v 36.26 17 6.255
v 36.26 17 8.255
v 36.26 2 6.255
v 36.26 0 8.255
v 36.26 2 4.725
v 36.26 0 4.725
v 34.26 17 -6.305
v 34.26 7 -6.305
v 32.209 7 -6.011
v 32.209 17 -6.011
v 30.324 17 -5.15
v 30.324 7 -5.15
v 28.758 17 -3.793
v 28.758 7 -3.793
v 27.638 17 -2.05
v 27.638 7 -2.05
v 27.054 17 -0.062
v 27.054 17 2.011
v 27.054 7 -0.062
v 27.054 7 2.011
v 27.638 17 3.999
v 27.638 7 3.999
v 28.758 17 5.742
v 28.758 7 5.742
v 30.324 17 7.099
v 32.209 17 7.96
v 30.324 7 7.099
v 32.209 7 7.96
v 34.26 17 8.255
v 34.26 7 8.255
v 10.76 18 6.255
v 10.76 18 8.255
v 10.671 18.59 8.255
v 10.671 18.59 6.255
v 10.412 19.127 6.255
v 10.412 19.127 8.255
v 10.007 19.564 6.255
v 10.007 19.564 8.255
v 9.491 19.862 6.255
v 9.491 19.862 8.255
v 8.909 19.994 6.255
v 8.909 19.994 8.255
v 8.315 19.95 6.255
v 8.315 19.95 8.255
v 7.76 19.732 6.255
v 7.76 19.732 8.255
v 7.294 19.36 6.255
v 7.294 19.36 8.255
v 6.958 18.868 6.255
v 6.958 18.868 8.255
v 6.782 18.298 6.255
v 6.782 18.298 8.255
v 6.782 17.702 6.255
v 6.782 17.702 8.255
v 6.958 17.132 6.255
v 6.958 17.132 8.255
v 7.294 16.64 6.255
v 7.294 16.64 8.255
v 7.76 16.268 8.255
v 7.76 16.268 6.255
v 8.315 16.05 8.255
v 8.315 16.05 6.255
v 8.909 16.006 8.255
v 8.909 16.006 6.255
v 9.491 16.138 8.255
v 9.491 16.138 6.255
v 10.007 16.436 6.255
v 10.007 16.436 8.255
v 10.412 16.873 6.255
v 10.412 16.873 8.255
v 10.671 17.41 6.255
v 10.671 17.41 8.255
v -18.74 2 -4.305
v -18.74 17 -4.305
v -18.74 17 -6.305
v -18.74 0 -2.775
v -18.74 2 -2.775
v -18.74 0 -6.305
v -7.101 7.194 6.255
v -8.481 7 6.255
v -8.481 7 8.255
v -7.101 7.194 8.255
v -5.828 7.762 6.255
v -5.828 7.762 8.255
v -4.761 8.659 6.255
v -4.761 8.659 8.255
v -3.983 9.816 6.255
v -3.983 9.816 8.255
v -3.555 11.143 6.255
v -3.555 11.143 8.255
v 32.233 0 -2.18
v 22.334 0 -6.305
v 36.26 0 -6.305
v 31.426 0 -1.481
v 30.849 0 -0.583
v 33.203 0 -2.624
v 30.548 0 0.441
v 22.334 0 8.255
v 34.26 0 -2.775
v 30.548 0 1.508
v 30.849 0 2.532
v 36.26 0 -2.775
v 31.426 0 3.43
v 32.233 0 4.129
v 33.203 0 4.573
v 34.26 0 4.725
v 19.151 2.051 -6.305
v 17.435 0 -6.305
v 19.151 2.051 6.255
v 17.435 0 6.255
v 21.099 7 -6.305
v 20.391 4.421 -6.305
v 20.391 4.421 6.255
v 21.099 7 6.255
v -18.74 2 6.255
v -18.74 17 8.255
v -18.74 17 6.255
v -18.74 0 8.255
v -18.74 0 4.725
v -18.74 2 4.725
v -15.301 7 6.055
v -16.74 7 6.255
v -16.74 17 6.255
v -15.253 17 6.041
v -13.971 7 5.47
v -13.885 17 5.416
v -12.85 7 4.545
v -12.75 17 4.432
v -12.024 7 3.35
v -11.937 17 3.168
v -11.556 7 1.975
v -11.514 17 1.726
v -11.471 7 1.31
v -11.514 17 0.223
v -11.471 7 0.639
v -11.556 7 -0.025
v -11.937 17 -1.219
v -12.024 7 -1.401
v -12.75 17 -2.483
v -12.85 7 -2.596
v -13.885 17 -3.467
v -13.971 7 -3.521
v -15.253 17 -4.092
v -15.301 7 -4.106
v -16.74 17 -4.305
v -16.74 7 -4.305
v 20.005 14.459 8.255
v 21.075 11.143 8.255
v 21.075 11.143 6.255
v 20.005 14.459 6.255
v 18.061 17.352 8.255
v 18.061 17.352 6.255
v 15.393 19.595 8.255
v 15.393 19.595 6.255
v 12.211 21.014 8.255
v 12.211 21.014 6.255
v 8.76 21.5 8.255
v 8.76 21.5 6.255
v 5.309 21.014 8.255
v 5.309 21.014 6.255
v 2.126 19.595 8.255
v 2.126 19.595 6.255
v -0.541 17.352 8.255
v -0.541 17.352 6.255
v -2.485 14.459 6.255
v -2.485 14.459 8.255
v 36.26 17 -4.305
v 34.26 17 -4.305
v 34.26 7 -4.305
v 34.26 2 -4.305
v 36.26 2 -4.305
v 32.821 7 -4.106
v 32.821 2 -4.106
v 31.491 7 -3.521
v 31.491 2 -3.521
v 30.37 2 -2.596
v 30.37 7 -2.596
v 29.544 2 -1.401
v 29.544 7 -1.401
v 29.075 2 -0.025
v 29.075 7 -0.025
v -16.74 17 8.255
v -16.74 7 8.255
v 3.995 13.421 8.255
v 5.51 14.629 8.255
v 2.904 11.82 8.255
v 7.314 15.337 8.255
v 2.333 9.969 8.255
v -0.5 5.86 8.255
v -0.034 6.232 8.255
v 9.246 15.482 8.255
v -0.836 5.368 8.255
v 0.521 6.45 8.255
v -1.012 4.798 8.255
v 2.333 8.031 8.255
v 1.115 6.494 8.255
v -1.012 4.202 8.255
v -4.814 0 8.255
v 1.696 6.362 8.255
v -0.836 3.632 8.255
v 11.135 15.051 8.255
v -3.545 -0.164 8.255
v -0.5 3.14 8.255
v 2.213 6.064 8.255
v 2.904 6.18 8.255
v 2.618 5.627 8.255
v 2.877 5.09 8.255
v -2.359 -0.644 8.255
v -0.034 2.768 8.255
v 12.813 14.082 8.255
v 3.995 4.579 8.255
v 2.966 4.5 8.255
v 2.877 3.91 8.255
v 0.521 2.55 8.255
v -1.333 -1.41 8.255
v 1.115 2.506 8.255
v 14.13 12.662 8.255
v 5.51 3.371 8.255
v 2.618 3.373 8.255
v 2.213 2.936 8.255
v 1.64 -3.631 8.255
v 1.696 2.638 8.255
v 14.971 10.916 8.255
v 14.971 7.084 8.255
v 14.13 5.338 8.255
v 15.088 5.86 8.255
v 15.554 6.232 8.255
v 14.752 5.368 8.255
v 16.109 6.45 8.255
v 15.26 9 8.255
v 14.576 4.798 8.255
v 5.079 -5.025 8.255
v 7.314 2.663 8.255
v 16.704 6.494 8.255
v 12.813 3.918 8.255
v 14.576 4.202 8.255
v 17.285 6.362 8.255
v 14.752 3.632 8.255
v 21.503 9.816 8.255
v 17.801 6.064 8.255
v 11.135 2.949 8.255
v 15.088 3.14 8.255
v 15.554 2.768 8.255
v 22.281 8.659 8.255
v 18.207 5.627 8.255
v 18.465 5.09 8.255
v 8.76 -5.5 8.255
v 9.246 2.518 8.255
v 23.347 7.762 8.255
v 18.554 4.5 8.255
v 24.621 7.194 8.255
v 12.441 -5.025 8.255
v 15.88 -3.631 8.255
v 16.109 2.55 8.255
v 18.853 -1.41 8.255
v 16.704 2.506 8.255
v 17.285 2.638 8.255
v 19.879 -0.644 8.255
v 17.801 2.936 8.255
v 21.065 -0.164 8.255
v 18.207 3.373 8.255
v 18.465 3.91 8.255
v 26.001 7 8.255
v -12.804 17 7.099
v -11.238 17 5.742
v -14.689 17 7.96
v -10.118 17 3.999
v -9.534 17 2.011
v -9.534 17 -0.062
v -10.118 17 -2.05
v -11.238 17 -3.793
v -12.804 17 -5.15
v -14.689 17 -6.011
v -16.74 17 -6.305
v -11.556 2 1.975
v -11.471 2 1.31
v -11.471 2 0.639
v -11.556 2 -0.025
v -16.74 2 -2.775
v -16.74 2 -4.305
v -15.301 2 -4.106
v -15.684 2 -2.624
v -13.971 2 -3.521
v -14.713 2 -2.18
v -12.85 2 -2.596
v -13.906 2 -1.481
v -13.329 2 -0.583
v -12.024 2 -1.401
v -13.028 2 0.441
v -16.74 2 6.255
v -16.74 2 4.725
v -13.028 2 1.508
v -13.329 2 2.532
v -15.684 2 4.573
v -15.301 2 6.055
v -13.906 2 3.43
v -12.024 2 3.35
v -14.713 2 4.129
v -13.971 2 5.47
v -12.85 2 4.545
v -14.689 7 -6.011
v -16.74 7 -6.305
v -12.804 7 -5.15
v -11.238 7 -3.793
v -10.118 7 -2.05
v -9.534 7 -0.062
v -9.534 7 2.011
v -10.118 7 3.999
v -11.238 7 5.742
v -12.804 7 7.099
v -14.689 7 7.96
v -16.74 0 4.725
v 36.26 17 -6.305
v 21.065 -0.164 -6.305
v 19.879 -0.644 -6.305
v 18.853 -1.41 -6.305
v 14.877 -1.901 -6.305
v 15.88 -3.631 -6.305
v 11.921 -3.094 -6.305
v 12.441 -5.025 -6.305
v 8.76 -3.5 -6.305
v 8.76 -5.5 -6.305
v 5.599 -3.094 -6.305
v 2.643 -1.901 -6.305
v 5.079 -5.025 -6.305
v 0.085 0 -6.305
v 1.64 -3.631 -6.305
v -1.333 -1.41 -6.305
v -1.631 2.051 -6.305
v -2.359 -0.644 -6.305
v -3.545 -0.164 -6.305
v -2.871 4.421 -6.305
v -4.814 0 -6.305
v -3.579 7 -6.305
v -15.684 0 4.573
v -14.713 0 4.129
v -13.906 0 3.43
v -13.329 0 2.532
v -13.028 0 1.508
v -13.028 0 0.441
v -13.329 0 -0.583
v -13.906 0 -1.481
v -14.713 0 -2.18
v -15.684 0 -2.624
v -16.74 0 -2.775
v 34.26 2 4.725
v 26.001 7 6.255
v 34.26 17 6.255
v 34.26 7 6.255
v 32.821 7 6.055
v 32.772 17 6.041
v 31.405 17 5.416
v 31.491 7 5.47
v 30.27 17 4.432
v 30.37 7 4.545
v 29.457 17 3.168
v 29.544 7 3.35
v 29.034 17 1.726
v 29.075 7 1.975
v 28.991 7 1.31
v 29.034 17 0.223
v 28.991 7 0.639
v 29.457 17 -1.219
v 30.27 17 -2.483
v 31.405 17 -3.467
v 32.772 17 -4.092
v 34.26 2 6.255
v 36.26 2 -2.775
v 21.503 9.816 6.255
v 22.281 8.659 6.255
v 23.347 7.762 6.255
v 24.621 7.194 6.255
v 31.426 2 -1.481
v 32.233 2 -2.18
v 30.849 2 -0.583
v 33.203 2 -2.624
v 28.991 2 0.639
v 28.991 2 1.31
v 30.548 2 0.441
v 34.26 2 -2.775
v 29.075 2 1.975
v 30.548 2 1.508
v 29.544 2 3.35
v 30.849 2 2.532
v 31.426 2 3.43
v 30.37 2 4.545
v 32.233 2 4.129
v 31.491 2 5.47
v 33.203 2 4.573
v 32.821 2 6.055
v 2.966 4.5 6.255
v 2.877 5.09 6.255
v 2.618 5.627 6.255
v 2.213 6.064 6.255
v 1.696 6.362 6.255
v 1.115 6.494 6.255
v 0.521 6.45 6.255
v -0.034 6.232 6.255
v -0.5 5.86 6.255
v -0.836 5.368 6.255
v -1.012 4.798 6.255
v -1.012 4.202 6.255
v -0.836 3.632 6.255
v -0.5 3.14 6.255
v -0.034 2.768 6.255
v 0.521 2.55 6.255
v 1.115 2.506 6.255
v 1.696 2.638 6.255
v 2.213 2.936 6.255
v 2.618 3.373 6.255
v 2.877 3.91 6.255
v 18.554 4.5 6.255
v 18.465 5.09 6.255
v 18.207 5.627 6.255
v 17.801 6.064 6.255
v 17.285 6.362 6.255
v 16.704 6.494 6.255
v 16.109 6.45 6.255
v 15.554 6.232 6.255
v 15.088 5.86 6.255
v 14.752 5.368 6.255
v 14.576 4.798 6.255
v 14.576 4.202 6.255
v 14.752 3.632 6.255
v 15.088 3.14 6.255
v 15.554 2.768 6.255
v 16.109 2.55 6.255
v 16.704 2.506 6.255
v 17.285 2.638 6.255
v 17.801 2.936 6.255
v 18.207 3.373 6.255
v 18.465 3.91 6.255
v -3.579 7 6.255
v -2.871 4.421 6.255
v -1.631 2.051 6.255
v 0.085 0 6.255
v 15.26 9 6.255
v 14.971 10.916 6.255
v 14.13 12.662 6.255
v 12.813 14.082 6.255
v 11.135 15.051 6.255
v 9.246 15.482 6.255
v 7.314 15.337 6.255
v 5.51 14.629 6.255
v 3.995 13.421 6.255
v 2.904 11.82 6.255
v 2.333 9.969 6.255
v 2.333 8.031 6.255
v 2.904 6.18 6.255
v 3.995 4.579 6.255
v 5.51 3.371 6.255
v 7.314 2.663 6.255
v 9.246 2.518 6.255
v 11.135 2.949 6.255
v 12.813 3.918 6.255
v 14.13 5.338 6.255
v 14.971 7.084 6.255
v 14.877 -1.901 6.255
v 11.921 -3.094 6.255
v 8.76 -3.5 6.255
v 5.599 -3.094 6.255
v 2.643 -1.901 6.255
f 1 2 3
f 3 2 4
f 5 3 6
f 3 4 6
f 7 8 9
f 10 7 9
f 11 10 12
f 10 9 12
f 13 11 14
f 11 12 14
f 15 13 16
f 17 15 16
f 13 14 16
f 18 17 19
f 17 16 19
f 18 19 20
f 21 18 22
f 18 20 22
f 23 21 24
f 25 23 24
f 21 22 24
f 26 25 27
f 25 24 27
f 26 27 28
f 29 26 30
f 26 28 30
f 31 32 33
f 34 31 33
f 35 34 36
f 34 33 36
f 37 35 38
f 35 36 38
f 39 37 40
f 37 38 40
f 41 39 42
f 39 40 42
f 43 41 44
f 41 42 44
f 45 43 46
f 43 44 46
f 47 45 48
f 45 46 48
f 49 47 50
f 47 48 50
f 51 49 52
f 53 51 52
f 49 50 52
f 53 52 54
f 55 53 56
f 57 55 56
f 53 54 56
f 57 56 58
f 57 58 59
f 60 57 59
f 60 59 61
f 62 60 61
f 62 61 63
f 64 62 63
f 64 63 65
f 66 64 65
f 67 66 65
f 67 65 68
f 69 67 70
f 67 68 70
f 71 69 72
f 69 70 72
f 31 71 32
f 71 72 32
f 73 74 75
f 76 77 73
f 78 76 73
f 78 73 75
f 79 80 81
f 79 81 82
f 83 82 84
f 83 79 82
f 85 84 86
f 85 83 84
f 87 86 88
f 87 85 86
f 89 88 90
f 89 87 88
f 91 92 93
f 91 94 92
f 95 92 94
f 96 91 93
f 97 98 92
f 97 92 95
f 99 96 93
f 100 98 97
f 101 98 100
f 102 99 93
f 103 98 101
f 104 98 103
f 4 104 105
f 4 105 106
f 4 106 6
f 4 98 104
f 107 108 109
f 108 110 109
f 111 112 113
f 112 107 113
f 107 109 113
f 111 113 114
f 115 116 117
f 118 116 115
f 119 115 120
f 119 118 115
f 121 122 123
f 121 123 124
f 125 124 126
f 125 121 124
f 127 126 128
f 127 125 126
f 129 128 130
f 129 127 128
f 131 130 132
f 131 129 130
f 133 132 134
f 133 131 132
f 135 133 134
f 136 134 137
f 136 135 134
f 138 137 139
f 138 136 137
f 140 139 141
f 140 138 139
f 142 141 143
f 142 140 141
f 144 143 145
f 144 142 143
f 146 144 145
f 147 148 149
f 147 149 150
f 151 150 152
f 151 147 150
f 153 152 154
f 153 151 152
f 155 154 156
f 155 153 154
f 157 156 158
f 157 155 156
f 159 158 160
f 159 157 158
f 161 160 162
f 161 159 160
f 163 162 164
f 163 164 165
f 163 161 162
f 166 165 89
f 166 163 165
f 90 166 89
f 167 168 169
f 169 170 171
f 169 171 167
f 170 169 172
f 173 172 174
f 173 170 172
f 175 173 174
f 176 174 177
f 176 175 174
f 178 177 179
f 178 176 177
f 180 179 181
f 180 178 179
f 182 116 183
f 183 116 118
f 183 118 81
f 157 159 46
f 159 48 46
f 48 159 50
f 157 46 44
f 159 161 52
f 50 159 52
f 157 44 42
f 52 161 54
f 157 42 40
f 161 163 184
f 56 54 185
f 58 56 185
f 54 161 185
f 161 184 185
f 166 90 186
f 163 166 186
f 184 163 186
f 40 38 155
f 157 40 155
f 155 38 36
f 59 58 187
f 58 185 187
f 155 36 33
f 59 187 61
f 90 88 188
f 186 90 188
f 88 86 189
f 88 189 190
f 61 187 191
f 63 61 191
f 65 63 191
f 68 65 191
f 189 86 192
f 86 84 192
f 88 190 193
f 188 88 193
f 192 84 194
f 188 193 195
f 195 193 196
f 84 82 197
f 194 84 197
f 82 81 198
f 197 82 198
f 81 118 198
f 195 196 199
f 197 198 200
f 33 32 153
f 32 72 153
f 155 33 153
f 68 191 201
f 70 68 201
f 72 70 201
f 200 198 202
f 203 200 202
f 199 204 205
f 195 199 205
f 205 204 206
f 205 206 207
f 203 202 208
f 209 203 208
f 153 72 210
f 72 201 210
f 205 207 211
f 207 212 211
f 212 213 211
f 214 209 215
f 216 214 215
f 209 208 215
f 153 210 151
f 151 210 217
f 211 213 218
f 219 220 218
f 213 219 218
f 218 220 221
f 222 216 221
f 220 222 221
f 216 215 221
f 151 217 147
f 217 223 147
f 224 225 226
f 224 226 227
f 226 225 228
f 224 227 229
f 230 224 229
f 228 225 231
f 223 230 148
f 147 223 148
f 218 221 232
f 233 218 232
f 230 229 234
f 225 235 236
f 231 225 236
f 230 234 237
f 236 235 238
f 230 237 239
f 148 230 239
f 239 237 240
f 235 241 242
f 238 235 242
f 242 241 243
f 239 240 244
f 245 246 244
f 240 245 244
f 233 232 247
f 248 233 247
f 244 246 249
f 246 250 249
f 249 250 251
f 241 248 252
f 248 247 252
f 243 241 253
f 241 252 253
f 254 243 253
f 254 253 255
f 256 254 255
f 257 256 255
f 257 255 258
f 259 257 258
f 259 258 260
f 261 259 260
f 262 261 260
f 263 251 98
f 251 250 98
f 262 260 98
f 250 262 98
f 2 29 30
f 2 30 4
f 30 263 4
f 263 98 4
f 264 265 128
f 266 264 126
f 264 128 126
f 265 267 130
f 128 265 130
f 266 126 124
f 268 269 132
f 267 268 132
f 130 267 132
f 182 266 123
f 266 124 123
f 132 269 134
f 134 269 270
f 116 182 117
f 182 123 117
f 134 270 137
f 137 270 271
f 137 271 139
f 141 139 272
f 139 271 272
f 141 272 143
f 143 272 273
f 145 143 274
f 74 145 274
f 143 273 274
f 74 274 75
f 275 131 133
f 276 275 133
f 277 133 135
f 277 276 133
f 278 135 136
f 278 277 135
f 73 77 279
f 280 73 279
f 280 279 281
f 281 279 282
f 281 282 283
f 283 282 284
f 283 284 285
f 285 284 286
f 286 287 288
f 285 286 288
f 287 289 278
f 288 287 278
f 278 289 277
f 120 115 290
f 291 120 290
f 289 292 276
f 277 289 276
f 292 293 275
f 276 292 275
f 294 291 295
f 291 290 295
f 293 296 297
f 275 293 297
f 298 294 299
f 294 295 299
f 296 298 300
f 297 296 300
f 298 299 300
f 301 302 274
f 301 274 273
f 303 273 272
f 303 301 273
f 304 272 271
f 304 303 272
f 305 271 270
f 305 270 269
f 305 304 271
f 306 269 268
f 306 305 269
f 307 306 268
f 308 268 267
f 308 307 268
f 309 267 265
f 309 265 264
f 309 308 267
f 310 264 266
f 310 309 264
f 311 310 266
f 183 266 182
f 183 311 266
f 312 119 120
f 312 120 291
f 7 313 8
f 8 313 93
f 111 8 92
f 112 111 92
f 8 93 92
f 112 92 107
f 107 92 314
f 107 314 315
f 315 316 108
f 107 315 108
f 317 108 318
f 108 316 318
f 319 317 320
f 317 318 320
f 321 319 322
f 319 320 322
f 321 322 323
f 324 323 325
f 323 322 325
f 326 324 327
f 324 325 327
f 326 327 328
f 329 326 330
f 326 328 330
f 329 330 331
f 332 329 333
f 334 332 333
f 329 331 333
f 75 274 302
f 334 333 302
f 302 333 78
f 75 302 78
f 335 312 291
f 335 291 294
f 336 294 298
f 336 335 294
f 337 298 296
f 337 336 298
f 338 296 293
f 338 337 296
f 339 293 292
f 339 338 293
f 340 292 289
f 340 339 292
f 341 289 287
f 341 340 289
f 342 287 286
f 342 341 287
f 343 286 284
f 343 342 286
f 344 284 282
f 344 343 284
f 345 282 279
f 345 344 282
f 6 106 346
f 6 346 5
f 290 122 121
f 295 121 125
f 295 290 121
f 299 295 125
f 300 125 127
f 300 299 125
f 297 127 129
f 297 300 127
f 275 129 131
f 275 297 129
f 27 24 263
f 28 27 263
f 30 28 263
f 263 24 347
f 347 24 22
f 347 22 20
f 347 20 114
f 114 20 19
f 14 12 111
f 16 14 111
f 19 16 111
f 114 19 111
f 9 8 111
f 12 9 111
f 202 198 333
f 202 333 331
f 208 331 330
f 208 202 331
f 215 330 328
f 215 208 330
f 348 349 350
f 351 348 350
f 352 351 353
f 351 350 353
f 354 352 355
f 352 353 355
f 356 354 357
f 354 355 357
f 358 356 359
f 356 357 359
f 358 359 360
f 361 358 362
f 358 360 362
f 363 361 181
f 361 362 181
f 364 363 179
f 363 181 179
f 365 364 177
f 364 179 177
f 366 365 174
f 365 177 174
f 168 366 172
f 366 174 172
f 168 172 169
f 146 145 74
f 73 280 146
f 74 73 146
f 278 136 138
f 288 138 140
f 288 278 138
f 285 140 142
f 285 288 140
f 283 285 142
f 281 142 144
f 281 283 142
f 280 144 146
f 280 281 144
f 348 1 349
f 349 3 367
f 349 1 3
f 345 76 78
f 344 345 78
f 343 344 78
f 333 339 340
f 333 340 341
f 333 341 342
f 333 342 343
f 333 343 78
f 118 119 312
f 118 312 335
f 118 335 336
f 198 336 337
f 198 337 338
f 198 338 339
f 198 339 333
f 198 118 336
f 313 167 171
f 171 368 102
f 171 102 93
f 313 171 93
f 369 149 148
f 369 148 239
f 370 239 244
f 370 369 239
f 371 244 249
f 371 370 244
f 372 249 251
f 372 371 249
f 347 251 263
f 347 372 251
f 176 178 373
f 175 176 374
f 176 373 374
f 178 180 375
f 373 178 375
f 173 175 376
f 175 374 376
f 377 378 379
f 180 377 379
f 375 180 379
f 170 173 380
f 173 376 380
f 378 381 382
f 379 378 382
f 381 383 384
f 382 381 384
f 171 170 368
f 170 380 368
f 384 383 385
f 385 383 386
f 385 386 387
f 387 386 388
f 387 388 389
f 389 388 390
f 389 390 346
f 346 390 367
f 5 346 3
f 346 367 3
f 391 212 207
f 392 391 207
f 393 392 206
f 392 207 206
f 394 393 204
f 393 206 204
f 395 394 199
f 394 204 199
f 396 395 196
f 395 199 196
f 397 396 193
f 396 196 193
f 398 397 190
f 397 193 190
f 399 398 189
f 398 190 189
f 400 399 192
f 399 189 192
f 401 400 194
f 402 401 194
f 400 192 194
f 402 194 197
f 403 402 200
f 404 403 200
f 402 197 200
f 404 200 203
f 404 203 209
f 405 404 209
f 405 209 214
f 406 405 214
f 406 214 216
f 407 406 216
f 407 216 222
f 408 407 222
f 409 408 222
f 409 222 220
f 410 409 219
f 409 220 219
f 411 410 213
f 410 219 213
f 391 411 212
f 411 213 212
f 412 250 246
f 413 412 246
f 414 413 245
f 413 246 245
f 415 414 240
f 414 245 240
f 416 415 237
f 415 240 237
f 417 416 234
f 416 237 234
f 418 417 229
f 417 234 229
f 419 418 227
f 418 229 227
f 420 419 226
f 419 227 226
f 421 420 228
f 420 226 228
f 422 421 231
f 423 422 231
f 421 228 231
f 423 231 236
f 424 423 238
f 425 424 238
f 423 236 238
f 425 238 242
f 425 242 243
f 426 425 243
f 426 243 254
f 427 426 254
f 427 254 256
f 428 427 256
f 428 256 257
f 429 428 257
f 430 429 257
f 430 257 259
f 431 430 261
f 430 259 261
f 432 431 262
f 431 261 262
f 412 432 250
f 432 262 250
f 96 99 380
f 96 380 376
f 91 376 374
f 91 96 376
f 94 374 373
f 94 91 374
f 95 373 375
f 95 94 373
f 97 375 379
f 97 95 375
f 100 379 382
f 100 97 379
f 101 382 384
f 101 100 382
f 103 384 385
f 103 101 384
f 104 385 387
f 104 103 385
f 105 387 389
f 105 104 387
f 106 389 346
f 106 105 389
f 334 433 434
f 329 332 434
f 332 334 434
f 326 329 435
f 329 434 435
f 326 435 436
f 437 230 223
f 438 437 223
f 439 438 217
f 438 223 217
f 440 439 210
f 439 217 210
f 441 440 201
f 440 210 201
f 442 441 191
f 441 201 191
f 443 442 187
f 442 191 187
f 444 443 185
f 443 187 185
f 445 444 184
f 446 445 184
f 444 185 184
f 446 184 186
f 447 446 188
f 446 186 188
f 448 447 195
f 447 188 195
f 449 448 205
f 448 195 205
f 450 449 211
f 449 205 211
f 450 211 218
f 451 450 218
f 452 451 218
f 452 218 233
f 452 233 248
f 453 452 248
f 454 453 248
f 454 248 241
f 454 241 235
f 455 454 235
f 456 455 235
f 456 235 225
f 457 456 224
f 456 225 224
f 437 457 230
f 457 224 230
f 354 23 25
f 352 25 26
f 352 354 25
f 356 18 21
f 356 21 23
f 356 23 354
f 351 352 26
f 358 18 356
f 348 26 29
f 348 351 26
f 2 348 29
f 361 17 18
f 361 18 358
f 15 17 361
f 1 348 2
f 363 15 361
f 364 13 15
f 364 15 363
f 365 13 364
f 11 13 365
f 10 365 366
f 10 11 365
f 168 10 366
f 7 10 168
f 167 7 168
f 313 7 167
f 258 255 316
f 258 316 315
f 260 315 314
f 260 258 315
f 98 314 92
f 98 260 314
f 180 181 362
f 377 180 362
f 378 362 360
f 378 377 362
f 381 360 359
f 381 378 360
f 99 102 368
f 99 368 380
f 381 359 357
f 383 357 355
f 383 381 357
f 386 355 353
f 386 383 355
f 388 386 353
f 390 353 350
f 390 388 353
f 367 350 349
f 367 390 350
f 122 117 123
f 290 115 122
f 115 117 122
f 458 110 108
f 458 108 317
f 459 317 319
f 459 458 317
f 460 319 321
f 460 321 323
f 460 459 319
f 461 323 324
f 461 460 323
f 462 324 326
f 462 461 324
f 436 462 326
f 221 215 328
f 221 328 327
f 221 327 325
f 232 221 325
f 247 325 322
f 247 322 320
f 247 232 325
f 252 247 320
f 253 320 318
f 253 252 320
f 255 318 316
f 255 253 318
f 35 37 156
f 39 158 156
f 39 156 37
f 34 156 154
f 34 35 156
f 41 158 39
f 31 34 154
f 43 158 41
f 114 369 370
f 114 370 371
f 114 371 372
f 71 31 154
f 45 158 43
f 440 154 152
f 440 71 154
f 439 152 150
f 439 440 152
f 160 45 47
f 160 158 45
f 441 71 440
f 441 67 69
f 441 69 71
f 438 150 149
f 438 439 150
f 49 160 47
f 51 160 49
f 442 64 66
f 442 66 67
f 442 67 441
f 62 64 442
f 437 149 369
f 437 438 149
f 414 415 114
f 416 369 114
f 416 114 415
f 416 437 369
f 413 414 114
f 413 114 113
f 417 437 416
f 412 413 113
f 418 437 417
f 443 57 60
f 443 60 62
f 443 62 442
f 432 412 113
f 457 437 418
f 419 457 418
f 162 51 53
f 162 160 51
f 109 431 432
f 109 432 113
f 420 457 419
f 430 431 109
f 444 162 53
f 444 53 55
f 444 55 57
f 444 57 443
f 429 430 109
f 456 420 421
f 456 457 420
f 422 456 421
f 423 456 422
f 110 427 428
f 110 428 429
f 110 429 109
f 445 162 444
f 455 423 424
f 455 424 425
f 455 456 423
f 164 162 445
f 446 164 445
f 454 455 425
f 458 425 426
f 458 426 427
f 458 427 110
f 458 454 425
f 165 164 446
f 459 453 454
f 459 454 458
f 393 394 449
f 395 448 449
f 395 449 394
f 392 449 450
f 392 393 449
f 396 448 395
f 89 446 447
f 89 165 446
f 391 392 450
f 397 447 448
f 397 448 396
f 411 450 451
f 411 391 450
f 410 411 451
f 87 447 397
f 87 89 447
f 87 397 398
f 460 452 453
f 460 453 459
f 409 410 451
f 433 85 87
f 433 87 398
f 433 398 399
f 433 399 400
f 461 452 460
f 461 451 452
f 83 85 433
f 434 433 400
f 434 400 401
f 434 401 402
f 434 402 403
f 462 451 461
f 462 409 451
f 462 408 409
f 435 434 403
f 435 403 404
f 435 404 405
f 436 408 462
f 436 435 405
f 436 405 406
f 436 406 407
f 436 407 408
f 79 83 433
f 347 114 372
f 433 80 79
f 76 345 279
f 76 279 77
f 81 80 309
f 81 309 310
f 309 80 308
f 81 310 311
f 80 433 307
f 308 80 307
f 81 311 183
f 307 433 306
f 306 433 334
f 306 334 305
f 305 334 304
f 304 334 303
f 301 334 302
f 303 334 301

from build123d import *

# Parameters (mm, degrees)
BOSS_EXTRU_1_DEPTH      = 7
BOSS_EXTRU_3_DEPTH      = 2
ESQUISSE2_RX            = 12.5
ESQUISSE2_RY            = 12.5
ENL_V_MAT_EXTRU_1_DEPTH = 40.69604363
ESQUISSE3_R             = 12.5
ESQUISSE3_R_2           = 6.5
ESQUISSE3_R_3           = 2
BOSS_EXTRU_2_DEPTH      = 2
BOSS_EXTRU_4_DEPTH      = 14.56
CONG_2_R                = 5
BOSS_EXTRU_5_DEPTH      = 10


with BuildPart() as part:
    # Esquisse1 → Boss.-Extru.1 (new body)
    with BuildSketch(Plane(origin=(0, 0, 0), x_dir=(1, 0, 0), z_dir=(0, 1, 0))):
        with BuildLine():
            Line((36.259926639, -6.254535912), (36.259926639, -8.254535912))
            Line((36.259926639, -8.254535912), (28.259926639, -8.254535912))
            Line((28.259926639, -8.254535912), (26.259926639, -8.254535912))
            Line((26.259926639, -8.254535912), (-8.740073361, -8.254535912))
            Line((-8.740073361, -8.254535912), (-10.740073361, -8.254535912))
            Line((-10.740073361, -8.254535912), (-18.740073361, -8.254535912))
            Line((-18.740073361, -8.254535912), (-18.740073361, -6.254535912))
            Line((-18.740073361, -6.254535912), (-16.740073361, -6.254535912))
            ThreePointArc((-16.740073361, -6.254535912), (-13.378645093, -5.04629229), (-11.555635108, -1.974535912))
            ThreePointArc((-11.555635108, -1.974535912), (-11.460073361, -0.974535912), (-11.555635108, 0.025464088))
            ThreePointArc((-11.555635108, 0.025464088), (-13.378645093, 3.097220466), (-16.740073361, 4.305464088))
            Line((-16.740073361, 4.305464088), (-18.740073361, 4.305464088))
            Line((-18.740073361, 4.305464088), (-18.740073361, 6.305464088))
            Line((-18.740073361, 6.305464088), (-10.740073361, 6.305464088))
            Line((-10.740073361, 6.305464088), (-8.740073361, 6.305464088))
            Line((-8.740073361, 6.305464088), (26.259926639, 6.305464088))
            Line((26.259926639, 6.305464088), (28.259926639, 6.305464088))
            Line((28.259926639, 6.305464088), (36.259926639, 6.305464088))
            Line((36.259926639, 6.305464088), (36.259926639, 4.305464088))
            Line((36.259926639, 4.305464088), (34.259926639, 4.305464088))
            ThreePointArc((34.259926639, 4.305464088), (30.898498371, 3.097220466), (29.075488386, 0.025464088))
            ThreePointArc((29.075488386, 0.025464088), (28.979926639, -0.974535912), (29.075488386, -1.974535912))
            ThreePointArc((29.075488386, -1.974535912), (30.898498371, -5.04629229), (34.259926639, -6.254535912))
            Line((34.259926639, -6.254535912), (36.259926639, -6.254535912))
        make_face()
    extrude(amount=BOSS_EXTRU_1_DEPTH)

    # Esquisse4 → Boss.-Extru.3 (add)
    with BuildSketch(Plane.XZ):
        with BuildLine():
            Line((34.259926639, 4.724535912), (36.259926639, 4.724535912))
            Line((36.259926639, 4.724535912), (36.259926639, 6.254535912))
            Line((36.259926639, 6.254535912), (34.259926639, 6.254535912))
            ThreePointArc((34.259926639, 6.254535912), (28.979926639, 0.974535912), (34.259926639, -4.305464088))
            Line((34.259926639, -4.305464088), (36.259926639, -4.305464088))
            Line((36.259926639, -4.305464088), (36.259926639, -2.775464088))
            Line((36.259926639, -2.775464088), (34.259926639, -2.775464088))
            ThreePointArc((34.259926639, -2.775464088), (30.509926639, 0.974535912), (34.259926639, 4.724535912))
        make_face()
        with BuildLine():
            Line((-18.740073361, -2.775464088), (-18.740073361, -4.305464088))
            Line((-18.740073361, -4.305464088), (-16.740073361, -4.305464088))
            ThreePointArc((-16.740073361, -4.305464088), (-11.460073361, 0.974535912), (-16.740073361, 6.254535912))
            Line((-16.740073361, 6.254535912), (-18.740073361, 6.254535912))
            Line((-18.740073361, 6.254535912), (-18.740073361, 4.724535912))
            Line((-18.740073361, 4.724535912), (-16.740073361, 4.724535912))
            ThreePointArc((-16.740073361, 4.724535912), (-12.990073361, 0.974535912), (-16.740073361, -2.775464088))
            Line((-16.740073361, -2.775464088), (-18.740073361, -2.775464088))
        make_face()
    extrude(amount=-BOSS_EXTRU_3_DEPTH)

    # Esquisse2 → Enlèv. mat.-Extru.1 (cut, through all)
    with BuildSketch(Plane.XY.offset(8.254535912)):
        with Locations(Location((8.759926639, 9), (0, 0, 180))):
            Ellipse(ESQUISSE2_RX, ESQUISSE2_RY)
    extrude(amount=-ENL_V_MAT_EXTRU_1_DEPTH, mode=Mode.SUBTRACT)


with BuildPart() as enl_v_mat_extru_1_piece_1:
    # of the separate pieces the step leaves, piece 1, a body of its own (enl_v_mat_extru_1_pieces)
    add(part.part.solids().sort_by_distance((-18.740073361, 7, -6.305464088))[0])

    # Esquisse3 → Boss.-Extru.2 (add)
    with BuildSketch(Plane.XY.offset(8.254535912)):
        with Locations((8.759926639, 9)):
            Circle(ESQUISSE3_R)
        with Locations((8.759926639, 9)):
            Circle(ESQUISSE3_R_2, mode=Mode.SUBTRACT)
        with Locations((8.759926639, 18)):
            Circle(ESQUISSE3_R_3, mode=Mode.SUBTRACT)
        with Locations((16.554155273, 4.5)):
            Circle(ESQUISSE3_R_3, mode=Mode.SUBTRACT)
        with Locations((0.965698005, 4.5)):
            Circle(ESQUISSE3_R_3, mode=Mode.SUBTRACT)
    extrude(amount=-BOSS_EXTRU_2_DEPTH)



with BuildPart() as enl_v_mat_extru_1_piece_2:
    # of the separate pieces the step leaves, piece 2, a body of its own (enl_v_mat_extru_1_pieces)
    add(part.part.solids().sort_by_distance((34.259926639, 2, 6.254535912))[0])


with BuildPart() as enl_v_mat_extru_1_piece_1_1:
    add(enl_v_mat_extru_1_piece_1.part)

    add(enl_v_mat_extru_1_piece_2.part)  # Boss.-Extru.4 merges Enlèv. mat.-Extru.1 piece 2
    # Esquisse6 → Boss.-Extru.4 (add)
    with BuildSketch(Plane.XY.offset(8.254535912)):
        with BuildLine():
            Line((0.085250852, 0), (-2.608890362, 0))
            ThreePointArc((-2.608890362, 0), (8.759926639, -5.5), (20.12874364, 0))
            Line((20.12874364, 0), (17.434602425, 0))
            ThreePointArc((17.434602425, 0), (8.759926639, -3.5), (0.085250852, 0))
        make_face()
    extrude(amount=-BOSS_EXTRU_4_DEPTH)

    # Congé2
    # the kernel refuses this fillet: 5 mm, written as the material it adds along each edge
    with BuildSketch(Plane(origin=(20.12874364, 0, 8.254535912), x_dir=(1, 0, 0), z_dir=(0, 0, -1))) as cong_2_piece_1:
        with BuildLine():
            CenterArc((2.20505496, 5), CONG_2_R, 225.885381452, 44.114618548)
            ThreePointArc((-1.27542503, 1.41025641), (-0.614570897, 0.726057307), (0, 0))
            Line((0, 0), (2.20505496, 0))
        make_face()
    extrude(amount=14.56)
    with BuildSketch(Plane(origin=(-2.608890362, 0, 8.254535912), x_dir=(0.6707625728642448, -0.7416721451184065, 0), z_dir=(0, 0, -1))) as cong_2_piece_2:
        with BuildLine():
            CenterArc((2.229292388, 4.989240706), CONG_2_R, 222.125947854, 44.114618548)
            Line((-1.479068338, 1.635427842), (0, 0))
            ThreePointArc((0, 0), (0.950727636, 0.031201952), (1.901455272, 0))
        make_face()
    extrude(amount=14.56)
    with BuildSketch(Plane(origin=(21.098889318, 7, 6.254535912), x_dir=(1, 0, 0), z_dir=(0, 0, 1))) as cong_2_piece_3:
        with BuildLine():
            CenterArc((4.90197697, 5), CONG_2_R, 189.870889606, 80.129110394)
            ThreePointArc((-0.024005787, 4.142857143), (0.160827475, 2.072430037), (0, 0))
            Line((0, 0), (4.90197697, 0))
        make_face()
    extrude(amount=2)
    with BuildSketch(Plane(origin=(-3.579036041, 7, 6.254535912), x_dir=(0.005794402962949308, 0.9999832123062381, 0), z_dir=(0, 0, 1))) as cong_2_piece_4:
        with BuildLine():
            CenterArc((4.971512032, 4.930866692), CONG_2_R, 180.331996692, 80.129110394)
            Line((-0.02840403, 4.901894677), (0, 0))
            ThreePointArc((0, 0), (2.071463347, 0.172833269), (4.142926693, 0))
        make_face()
    extrude(amount=2)

    # Esquisse7 → Boss.-Extru.5 (add)
    with BuildSketch(Plane(origin=(0, 7, 0), x_dir=(1, 0, 0), z_dir=(0, 1, 0))):
        with BuildLine():
            Line((36.259926639, -8.254535912), (36.259926639, -6.254535912))
            Line((36.259926639, -6.254535912), (34.259926639, -6.254535912))
            ThreePointArc((34.259926639, -6.254535912), (28.979926639, -0.974535912), (34.259926639, 4.305464088))
            Line((34.259926639, 4.305464088), (36.259926639, 4.305464088))
            Line((36.259926639, 4.305464088), (36.259926639, 6.305464088))
            Line((36.259926639, 6.305464088), (34.259926639, 6.305464088))
            ThreePointArc((34.259926639, 6.305464088), (26.979926639, -0.974535912), (34.259926639, -8.254535912))
            Line((34.259926639, -8.254535912), (36.259926639, -8.254535912))
        make_face()
        with BuildLine():
            Line((-18.740073361, 6.305464088), (-16.740073361, 6.305464088))
            ThreePointArc((-16.740073361, 6.305464088), (-9.460073361, -0.974535912), (-16.740073361, -8.254535912))
            Line((-16.740073361, -8.254535912), (-18.740073361, -8.254535912))
            Line((-18.740073361, -8.254535912), (-18.740073361, -6.254535912))
            Line((-18.740073361, -6.254535912), (-16.740073361, -6.254535912))
            ThreePointArc((-16.740073361, -6.254535912), (-11.460073361, -0.974535912), (-16.740073361, 4.305464088))
            Line((-16.740073361, 4.305464088), (-18.740073361, 4.305464088))
            Line((-18.740073361, 4.305464088), (-18.740073361, 6.305464088))
        make_face()
    extrude(amount=BOSS_EXTRU_5_DEPTH)


solid = enl_v_mat_extru_1_piece_1_1.part
